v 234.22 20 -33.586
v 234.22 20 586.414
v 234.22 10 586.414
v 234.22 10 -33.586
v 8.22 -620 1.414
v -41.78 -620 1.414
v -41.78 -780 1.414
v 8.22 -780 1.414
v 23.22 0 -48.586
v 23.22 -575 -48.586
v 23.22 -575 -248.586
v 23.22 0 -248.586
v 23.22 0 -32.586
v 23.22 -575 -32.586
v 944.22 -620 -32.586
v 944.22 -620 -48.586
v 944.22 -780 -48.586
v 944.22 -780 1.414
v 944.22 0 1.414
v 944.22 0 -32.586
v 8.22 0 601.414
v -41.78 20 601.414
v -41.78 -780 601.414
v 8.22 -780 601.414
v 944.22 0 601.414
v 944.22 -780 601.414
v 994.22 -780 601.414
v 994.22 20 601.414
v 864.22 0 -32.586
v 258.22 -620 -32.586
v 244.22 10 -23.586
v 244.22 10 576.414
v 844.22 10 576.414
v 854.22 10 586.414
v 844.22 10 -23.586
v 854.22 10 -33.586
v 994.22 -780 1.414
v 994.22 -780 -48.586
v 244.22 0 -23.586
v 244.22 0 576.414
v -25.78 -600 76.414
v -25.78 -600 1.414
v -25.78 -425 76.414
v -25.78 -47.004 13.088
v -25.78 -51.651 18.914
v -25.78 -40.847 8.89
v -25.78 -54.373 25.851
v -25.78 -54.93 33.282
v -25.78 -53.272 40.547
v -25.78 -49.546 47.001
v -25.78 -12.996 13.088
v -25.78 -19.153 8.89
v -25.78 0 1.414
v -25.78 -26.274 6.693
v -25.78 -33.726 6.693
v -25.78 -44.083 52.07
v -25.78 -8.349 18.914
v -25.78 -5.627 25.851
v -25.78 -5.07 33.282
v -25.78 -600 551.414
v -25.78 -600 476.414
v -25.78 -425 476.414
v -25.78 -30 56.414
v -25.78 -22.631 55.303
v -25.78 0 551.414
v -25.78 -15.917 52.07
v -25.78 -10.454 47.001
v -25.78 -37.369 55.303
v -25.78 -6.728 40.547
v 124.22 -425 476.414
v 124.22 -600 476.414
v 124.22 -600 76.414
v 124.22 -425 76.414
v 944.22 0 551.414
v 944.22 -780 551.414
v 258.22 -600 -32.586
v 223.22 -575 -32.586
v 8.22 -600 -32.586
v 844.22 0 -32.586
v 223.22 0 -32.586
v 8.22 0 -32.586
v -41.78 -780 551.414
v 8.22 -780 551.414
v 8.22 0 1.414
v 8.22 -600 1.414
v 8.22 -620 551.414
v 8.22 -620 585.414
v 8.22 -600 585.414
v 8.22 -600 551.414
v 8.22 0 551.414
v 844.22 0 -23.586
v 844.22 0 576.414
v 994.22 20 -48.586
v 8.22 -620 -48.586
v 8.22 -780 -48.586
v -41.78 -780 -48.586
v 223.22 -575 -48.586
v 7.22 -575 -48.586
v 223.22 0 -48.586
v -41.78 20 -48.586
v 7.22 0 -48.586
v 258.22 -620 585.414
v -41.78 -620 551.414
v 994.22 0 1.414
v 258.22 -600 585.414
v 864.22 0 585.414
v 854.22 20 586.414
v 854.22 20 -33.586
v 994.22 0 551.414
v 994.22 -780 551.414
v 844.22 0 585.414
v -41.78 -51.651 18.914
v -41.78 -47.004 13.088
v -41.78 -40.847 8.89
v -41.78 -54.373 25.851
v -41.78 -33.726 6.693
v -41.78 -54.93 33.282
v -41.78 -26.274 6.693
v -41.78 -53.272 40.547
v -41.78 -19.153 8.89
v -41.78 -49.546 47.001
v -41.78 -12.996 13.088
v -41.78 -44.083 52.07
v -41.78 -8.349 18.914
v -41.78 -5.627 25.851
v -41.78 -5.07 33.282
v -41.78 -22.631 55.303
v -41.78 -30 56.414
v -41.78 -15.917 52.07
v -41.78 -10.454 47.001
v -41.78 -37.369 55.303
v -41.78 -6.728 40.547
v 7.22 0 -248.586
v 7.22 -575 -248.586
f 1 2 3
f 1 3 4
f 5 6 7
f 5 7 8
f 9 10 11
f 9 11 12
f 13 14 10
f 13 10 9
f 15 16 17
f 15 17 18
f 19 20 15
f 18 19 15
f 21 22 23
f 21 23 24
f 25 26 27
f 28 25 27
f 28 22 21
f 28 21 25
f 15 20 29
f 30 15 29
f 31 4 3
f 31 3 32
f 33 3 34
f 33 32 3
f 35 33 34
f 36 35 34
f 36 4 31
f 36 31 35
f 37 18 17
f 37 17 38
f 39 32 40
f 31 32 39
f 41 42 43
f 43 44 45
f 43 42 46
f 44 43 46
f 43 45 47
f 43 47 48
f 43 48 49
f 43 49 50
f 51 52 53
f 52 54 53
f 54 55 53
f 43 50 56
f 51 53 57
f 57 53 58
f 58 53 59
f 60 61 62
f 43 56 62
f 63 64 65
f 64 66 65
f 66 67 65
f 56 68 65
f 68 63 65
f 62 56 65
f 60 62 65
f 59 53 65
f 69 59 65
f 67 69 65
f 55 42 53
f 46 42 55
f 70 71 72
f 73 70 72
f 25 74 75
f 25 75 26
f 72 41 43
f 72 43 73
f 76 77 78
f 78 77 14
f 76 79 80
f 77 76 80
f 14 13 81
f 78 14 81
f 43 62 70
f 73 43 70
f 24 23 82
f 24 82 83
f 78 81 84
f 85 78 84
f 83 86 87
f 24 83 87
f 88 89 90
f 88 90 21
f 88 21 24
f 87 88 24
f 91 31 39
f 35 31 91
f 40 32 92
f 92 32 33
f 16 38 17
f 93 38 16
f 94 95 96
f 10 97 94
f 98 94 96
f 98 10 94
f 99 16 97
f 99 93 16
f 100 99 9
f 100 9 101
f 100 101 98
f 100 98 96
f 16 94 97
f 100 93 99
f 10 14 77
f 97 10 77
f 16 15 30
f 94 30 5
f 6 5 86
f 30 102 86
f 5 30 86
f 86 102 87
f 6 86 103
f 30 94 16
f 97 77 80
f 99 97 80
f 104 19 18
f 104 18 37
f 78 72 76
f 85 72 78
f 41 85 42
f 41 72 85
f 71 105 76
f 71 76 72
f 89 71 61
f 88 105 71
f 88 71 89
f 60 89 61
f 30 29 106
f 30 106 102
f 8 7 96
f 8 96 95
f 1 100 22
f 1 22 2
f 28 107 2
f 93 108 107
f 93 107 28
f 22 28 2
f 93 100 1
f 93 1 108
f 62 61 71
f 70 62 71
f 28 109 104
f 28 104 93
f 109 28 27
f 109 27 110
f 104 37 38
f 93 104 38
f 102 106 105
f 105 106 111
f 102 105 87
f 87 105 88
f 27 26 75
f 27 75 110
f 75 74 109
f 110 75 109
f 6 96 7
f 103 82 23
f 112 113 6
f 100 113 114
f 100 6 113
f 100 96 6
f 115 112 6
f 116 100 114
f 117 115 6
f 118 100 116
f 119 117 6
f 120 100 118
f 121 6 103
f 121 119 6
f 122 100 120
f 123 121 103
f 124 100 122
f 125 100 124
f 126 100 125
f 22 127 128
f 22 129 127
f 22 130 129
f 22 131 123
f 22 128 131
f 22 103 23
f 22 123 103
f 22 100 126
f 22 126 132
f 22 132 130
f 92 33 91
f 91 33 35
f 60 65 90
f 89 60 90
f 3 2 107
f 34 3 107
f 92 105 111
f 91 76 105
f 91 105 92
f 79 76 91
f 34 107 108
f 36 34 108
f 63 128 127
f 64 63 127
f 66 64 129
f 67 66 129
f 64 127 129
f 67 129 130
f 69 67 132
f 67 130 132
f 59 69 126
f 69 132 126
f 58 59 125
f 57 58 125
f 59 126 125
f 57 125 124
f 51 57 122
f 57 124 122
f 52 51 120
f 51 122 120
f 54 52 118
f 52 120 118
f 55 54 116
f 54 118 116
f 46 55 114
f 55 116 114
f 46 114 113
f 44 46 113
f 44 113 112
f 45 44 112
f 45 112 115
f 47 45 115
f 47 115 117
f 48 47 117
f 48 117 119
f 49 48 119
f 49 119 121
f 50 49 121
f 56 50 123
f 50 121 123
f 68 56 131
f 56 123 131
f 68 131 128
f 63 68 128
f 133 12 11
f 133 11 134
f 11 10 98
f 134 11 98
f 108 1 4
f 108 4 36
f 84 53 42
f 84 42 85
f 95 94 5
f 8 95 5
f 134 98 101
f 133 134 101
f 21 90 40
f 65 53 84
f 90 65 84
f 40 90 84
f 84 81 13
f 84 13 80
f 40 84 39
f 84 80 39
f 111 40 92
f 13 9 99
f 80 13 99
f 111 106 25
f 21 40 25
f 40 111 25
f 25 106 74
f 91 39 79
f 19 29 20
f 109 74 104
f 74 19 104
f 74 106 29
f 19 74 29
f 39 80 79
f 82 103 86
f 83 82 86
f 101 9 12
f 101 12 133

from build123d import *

# Parameters (mm, degrees)
ESQUISSE2_W             = 1036
ESQUISSE2_H             = 650
BOSS_EXTRU_1_DEPTH      = 20
ESQUISSE3_W             = 620
ESQUISSE3_H             = 620
ENL_V_MAT_EXTRU_1_DEPTH = 10
ESQUISSE4_W             = 600
ESQUISSE4_H             = 600
ENL_V_MAT_EXTRU_2_DEPTH = 10
ESQUISSE5_W             = 50
ESQUISSE5_H             = 50
BOSS_EXTRU_2_DEPTH      = 780
ESQUISSE6_W             = 16
ESQUISSE6_H             = 550
BOSS_EXTRU_3_DEPTH      = 620
BOSS_EXTRU_5_DEPTH      = 20
ESQUISSE10_W            = 150
ESQUISSE10_H            = 400
BOSS_EXTRU_6_DEPTH      = 175
ESQUISSE20_R            = 25
ENL_V_MAT_EXTRU_4_DEPTH = 16
ESQUISSE21_W            = 936
ESQUISSE21_H            = 620
BOSS_EXTRU_7_DEPTH      = 16
BOSS_EXTRU_8_DEPTH      = 618
ESQUISSE25_W            = 200
ESQUISSE25_H            = 575
ENL_V_MAT_EXTRU_5_DEPTH = 16
ESQUISSE26_W            = 16
ESQUISSE26_H            = 575
BOSS_EXTRU_9_DEPTH      = 200


with BuildPart() as part:
    # Esquisse2 → Boss.-Extru.1 (new body)
    with BuildSketch(Plane(origin=(0, 0, 0), x_dir=(1, 0, 0), z_dir=(0, 1, 0))):
        with Locations((476.22027439, -276.413871951)):
            Rectangle(ESQUISSE2_W, ESQUISSE2_H)
    extrude(amount=BOSS_EXTRU_1_DEPTH)

    # Esquisse3 → Enlèv. mat.-Extru.1 (cut)
    with BuildSketch(Plane(origin=(0, 20, 0), x_dir=(1, 0, 0), z_dir=(0, 1, 0))):
        with Locations((544.22027439, -276.413871951)):
            Rectangle(ESQUISSE3_W, ESQUISSE3_H)
    extrude(amount=-ENL_V_MAT_EXTRU_1_DEPTH, mode=Mode.SUBTRACT)

    # Esquisse4 → Enlèv. mat.-Extru.2 (cut)
    with BuildSketch(Plane(origin=(0, 10, 0), x_dir=(1, 0, 0), z_dir=(0, 1, 0))):
        with Locations((544.22027439, -276.413871951)):
            Rectangle(ESQUISSE4_W, ESQUISSE4_H)
    extrude(amount=-ENL_V_MAT_EXTRU_2_DEPTH, mode=Mode.SUBTRACT)

    # Esquisse5 → Boss.-Extru.2 (add)
    with BuildSketch(Plane.XZ):
        with Locations((-16.77972561, 576.413871951)):
            Rectangle(ESQUISSE5_W, ESQUISSE5_H)
        with Locations((969.22027439, 576.413871951)):
            Rectangle(ESQUISSE5_W, ESQUISSE5_H)
        with Locations((-16.77972561, -23.586128049)):
            Rectangle(ESQUISSE5_W, ESQUISSE5_H)
        with Locations((969.22027439, -23.586128049)):
            Rectangle(ESQUISSE5_W, ESQUISSE5_H)
    extrude(amount=BOSS_EXTRU_2_DEPTH)

    # Esquisse6 → Boss.-Extru.3 (add)
    with BuildSketch(Plane.XZ):
        with Locations((-33.77972561, 276.413871951)):
            Rectangle(ESQUISSE6_W, ESQUISSE6_H)
    extrude(amount=BOSS_EXTRU_3_DEPTH)

    # Esquisse8 → Boss.-Extru.5 (add)
    with BuildSketch(Plane.XZ.offset(620)):
        Polygon((-25.77972561, 551.413871951), (8.22027439, 551.413871951), (8.22027439, 585.413871951), (258.22027439, 585.413871951), (258.22027439, -32.586128049), (8.22027439, -32.586128049), (8.22027439, 1.413871951), (-25.77972561, 1.413871951), align=None)
    extrude(amount=-BOSS_EXTRU_5_DEPTH)

    # Esquisse10 → Boss.-Extru.6 (add)
    with BuildSketch(Plane(origin=(0, -600, 0), x_dir=(1, 0, 0), z_dir=(0, 1, 0))):
        with Locations((49.22027439, -276.413871951)):
            Rectangle(ESQUISSE10_W, ESQUISSE10_H)
    extrude(amount=BOSS_EXTRU_6_DEPTH)

    # Esquisse20 → Enlèv. mat.-Extru.4 (cut)
    with BuildSketch(Plane.ZY.offset(41.77972561)):
        with Locations((31.413871951, -30)):
            Circle(ESQUISSE20_R)
    extrude(amount=-ENL_V_MAT_EXTRU_4_DEPTH, mode=Mode.SUBTRACT)

    # Esquisse21 → Boss.-Extru.7 (add)
    with BuildSketch(Plane(origin=(0, 0, -32.586128049), x_dir=(-1, 0, 0), z_dir=(0, 0, -1))):
        with Locations((-476.22027439, -310)):
            Rectangle(ESQUISSE21_W, ESQUISSE21_H)
    extrude(amount=BOSS_EXTRU_7_DEPTH)

    # Esquisse24 → Boss.-Extru.8 (add)
    with BuildSketch(Plane.XY.offset(-32.586128049)):
        Polygon((258.22027439, -620), (258.22027439, -600), (844.22027439, 0), (864.22027439, 0), align=None)
    extrude(amount=BOSS_EXTRU_8_DEPTH)

    # Esquisse25 → Enlèv. mat.-Extru.5 (cut)
    with BuildSketch(Plane.XY.offset(-32.586128049)):
        with Locations((123.22027439, -287.5)):
            Rectangle(ESQUISSE25_W, ESQUISSE25_H)
    extrude(amount=-ENL_V_MAT_EXTRU_5_DEPTH, mode=Mode.SUBTRACT)

    # Esquisse26 → Boss.-Extru.9 (add)
    with BuildSketch(Plane(origin=(0, 0, -48.586128049), x_dir=(-1, 0, 0), z_dir=(0, 0, -1))):
        with Locations((-15.22027439, -287.5)):
            Rectangle(ESQUISSE26_W, ESQUISSE26_H)
    extrude(amount=BOSS_EXTRU_9_DEPTH)


solid = part.part
